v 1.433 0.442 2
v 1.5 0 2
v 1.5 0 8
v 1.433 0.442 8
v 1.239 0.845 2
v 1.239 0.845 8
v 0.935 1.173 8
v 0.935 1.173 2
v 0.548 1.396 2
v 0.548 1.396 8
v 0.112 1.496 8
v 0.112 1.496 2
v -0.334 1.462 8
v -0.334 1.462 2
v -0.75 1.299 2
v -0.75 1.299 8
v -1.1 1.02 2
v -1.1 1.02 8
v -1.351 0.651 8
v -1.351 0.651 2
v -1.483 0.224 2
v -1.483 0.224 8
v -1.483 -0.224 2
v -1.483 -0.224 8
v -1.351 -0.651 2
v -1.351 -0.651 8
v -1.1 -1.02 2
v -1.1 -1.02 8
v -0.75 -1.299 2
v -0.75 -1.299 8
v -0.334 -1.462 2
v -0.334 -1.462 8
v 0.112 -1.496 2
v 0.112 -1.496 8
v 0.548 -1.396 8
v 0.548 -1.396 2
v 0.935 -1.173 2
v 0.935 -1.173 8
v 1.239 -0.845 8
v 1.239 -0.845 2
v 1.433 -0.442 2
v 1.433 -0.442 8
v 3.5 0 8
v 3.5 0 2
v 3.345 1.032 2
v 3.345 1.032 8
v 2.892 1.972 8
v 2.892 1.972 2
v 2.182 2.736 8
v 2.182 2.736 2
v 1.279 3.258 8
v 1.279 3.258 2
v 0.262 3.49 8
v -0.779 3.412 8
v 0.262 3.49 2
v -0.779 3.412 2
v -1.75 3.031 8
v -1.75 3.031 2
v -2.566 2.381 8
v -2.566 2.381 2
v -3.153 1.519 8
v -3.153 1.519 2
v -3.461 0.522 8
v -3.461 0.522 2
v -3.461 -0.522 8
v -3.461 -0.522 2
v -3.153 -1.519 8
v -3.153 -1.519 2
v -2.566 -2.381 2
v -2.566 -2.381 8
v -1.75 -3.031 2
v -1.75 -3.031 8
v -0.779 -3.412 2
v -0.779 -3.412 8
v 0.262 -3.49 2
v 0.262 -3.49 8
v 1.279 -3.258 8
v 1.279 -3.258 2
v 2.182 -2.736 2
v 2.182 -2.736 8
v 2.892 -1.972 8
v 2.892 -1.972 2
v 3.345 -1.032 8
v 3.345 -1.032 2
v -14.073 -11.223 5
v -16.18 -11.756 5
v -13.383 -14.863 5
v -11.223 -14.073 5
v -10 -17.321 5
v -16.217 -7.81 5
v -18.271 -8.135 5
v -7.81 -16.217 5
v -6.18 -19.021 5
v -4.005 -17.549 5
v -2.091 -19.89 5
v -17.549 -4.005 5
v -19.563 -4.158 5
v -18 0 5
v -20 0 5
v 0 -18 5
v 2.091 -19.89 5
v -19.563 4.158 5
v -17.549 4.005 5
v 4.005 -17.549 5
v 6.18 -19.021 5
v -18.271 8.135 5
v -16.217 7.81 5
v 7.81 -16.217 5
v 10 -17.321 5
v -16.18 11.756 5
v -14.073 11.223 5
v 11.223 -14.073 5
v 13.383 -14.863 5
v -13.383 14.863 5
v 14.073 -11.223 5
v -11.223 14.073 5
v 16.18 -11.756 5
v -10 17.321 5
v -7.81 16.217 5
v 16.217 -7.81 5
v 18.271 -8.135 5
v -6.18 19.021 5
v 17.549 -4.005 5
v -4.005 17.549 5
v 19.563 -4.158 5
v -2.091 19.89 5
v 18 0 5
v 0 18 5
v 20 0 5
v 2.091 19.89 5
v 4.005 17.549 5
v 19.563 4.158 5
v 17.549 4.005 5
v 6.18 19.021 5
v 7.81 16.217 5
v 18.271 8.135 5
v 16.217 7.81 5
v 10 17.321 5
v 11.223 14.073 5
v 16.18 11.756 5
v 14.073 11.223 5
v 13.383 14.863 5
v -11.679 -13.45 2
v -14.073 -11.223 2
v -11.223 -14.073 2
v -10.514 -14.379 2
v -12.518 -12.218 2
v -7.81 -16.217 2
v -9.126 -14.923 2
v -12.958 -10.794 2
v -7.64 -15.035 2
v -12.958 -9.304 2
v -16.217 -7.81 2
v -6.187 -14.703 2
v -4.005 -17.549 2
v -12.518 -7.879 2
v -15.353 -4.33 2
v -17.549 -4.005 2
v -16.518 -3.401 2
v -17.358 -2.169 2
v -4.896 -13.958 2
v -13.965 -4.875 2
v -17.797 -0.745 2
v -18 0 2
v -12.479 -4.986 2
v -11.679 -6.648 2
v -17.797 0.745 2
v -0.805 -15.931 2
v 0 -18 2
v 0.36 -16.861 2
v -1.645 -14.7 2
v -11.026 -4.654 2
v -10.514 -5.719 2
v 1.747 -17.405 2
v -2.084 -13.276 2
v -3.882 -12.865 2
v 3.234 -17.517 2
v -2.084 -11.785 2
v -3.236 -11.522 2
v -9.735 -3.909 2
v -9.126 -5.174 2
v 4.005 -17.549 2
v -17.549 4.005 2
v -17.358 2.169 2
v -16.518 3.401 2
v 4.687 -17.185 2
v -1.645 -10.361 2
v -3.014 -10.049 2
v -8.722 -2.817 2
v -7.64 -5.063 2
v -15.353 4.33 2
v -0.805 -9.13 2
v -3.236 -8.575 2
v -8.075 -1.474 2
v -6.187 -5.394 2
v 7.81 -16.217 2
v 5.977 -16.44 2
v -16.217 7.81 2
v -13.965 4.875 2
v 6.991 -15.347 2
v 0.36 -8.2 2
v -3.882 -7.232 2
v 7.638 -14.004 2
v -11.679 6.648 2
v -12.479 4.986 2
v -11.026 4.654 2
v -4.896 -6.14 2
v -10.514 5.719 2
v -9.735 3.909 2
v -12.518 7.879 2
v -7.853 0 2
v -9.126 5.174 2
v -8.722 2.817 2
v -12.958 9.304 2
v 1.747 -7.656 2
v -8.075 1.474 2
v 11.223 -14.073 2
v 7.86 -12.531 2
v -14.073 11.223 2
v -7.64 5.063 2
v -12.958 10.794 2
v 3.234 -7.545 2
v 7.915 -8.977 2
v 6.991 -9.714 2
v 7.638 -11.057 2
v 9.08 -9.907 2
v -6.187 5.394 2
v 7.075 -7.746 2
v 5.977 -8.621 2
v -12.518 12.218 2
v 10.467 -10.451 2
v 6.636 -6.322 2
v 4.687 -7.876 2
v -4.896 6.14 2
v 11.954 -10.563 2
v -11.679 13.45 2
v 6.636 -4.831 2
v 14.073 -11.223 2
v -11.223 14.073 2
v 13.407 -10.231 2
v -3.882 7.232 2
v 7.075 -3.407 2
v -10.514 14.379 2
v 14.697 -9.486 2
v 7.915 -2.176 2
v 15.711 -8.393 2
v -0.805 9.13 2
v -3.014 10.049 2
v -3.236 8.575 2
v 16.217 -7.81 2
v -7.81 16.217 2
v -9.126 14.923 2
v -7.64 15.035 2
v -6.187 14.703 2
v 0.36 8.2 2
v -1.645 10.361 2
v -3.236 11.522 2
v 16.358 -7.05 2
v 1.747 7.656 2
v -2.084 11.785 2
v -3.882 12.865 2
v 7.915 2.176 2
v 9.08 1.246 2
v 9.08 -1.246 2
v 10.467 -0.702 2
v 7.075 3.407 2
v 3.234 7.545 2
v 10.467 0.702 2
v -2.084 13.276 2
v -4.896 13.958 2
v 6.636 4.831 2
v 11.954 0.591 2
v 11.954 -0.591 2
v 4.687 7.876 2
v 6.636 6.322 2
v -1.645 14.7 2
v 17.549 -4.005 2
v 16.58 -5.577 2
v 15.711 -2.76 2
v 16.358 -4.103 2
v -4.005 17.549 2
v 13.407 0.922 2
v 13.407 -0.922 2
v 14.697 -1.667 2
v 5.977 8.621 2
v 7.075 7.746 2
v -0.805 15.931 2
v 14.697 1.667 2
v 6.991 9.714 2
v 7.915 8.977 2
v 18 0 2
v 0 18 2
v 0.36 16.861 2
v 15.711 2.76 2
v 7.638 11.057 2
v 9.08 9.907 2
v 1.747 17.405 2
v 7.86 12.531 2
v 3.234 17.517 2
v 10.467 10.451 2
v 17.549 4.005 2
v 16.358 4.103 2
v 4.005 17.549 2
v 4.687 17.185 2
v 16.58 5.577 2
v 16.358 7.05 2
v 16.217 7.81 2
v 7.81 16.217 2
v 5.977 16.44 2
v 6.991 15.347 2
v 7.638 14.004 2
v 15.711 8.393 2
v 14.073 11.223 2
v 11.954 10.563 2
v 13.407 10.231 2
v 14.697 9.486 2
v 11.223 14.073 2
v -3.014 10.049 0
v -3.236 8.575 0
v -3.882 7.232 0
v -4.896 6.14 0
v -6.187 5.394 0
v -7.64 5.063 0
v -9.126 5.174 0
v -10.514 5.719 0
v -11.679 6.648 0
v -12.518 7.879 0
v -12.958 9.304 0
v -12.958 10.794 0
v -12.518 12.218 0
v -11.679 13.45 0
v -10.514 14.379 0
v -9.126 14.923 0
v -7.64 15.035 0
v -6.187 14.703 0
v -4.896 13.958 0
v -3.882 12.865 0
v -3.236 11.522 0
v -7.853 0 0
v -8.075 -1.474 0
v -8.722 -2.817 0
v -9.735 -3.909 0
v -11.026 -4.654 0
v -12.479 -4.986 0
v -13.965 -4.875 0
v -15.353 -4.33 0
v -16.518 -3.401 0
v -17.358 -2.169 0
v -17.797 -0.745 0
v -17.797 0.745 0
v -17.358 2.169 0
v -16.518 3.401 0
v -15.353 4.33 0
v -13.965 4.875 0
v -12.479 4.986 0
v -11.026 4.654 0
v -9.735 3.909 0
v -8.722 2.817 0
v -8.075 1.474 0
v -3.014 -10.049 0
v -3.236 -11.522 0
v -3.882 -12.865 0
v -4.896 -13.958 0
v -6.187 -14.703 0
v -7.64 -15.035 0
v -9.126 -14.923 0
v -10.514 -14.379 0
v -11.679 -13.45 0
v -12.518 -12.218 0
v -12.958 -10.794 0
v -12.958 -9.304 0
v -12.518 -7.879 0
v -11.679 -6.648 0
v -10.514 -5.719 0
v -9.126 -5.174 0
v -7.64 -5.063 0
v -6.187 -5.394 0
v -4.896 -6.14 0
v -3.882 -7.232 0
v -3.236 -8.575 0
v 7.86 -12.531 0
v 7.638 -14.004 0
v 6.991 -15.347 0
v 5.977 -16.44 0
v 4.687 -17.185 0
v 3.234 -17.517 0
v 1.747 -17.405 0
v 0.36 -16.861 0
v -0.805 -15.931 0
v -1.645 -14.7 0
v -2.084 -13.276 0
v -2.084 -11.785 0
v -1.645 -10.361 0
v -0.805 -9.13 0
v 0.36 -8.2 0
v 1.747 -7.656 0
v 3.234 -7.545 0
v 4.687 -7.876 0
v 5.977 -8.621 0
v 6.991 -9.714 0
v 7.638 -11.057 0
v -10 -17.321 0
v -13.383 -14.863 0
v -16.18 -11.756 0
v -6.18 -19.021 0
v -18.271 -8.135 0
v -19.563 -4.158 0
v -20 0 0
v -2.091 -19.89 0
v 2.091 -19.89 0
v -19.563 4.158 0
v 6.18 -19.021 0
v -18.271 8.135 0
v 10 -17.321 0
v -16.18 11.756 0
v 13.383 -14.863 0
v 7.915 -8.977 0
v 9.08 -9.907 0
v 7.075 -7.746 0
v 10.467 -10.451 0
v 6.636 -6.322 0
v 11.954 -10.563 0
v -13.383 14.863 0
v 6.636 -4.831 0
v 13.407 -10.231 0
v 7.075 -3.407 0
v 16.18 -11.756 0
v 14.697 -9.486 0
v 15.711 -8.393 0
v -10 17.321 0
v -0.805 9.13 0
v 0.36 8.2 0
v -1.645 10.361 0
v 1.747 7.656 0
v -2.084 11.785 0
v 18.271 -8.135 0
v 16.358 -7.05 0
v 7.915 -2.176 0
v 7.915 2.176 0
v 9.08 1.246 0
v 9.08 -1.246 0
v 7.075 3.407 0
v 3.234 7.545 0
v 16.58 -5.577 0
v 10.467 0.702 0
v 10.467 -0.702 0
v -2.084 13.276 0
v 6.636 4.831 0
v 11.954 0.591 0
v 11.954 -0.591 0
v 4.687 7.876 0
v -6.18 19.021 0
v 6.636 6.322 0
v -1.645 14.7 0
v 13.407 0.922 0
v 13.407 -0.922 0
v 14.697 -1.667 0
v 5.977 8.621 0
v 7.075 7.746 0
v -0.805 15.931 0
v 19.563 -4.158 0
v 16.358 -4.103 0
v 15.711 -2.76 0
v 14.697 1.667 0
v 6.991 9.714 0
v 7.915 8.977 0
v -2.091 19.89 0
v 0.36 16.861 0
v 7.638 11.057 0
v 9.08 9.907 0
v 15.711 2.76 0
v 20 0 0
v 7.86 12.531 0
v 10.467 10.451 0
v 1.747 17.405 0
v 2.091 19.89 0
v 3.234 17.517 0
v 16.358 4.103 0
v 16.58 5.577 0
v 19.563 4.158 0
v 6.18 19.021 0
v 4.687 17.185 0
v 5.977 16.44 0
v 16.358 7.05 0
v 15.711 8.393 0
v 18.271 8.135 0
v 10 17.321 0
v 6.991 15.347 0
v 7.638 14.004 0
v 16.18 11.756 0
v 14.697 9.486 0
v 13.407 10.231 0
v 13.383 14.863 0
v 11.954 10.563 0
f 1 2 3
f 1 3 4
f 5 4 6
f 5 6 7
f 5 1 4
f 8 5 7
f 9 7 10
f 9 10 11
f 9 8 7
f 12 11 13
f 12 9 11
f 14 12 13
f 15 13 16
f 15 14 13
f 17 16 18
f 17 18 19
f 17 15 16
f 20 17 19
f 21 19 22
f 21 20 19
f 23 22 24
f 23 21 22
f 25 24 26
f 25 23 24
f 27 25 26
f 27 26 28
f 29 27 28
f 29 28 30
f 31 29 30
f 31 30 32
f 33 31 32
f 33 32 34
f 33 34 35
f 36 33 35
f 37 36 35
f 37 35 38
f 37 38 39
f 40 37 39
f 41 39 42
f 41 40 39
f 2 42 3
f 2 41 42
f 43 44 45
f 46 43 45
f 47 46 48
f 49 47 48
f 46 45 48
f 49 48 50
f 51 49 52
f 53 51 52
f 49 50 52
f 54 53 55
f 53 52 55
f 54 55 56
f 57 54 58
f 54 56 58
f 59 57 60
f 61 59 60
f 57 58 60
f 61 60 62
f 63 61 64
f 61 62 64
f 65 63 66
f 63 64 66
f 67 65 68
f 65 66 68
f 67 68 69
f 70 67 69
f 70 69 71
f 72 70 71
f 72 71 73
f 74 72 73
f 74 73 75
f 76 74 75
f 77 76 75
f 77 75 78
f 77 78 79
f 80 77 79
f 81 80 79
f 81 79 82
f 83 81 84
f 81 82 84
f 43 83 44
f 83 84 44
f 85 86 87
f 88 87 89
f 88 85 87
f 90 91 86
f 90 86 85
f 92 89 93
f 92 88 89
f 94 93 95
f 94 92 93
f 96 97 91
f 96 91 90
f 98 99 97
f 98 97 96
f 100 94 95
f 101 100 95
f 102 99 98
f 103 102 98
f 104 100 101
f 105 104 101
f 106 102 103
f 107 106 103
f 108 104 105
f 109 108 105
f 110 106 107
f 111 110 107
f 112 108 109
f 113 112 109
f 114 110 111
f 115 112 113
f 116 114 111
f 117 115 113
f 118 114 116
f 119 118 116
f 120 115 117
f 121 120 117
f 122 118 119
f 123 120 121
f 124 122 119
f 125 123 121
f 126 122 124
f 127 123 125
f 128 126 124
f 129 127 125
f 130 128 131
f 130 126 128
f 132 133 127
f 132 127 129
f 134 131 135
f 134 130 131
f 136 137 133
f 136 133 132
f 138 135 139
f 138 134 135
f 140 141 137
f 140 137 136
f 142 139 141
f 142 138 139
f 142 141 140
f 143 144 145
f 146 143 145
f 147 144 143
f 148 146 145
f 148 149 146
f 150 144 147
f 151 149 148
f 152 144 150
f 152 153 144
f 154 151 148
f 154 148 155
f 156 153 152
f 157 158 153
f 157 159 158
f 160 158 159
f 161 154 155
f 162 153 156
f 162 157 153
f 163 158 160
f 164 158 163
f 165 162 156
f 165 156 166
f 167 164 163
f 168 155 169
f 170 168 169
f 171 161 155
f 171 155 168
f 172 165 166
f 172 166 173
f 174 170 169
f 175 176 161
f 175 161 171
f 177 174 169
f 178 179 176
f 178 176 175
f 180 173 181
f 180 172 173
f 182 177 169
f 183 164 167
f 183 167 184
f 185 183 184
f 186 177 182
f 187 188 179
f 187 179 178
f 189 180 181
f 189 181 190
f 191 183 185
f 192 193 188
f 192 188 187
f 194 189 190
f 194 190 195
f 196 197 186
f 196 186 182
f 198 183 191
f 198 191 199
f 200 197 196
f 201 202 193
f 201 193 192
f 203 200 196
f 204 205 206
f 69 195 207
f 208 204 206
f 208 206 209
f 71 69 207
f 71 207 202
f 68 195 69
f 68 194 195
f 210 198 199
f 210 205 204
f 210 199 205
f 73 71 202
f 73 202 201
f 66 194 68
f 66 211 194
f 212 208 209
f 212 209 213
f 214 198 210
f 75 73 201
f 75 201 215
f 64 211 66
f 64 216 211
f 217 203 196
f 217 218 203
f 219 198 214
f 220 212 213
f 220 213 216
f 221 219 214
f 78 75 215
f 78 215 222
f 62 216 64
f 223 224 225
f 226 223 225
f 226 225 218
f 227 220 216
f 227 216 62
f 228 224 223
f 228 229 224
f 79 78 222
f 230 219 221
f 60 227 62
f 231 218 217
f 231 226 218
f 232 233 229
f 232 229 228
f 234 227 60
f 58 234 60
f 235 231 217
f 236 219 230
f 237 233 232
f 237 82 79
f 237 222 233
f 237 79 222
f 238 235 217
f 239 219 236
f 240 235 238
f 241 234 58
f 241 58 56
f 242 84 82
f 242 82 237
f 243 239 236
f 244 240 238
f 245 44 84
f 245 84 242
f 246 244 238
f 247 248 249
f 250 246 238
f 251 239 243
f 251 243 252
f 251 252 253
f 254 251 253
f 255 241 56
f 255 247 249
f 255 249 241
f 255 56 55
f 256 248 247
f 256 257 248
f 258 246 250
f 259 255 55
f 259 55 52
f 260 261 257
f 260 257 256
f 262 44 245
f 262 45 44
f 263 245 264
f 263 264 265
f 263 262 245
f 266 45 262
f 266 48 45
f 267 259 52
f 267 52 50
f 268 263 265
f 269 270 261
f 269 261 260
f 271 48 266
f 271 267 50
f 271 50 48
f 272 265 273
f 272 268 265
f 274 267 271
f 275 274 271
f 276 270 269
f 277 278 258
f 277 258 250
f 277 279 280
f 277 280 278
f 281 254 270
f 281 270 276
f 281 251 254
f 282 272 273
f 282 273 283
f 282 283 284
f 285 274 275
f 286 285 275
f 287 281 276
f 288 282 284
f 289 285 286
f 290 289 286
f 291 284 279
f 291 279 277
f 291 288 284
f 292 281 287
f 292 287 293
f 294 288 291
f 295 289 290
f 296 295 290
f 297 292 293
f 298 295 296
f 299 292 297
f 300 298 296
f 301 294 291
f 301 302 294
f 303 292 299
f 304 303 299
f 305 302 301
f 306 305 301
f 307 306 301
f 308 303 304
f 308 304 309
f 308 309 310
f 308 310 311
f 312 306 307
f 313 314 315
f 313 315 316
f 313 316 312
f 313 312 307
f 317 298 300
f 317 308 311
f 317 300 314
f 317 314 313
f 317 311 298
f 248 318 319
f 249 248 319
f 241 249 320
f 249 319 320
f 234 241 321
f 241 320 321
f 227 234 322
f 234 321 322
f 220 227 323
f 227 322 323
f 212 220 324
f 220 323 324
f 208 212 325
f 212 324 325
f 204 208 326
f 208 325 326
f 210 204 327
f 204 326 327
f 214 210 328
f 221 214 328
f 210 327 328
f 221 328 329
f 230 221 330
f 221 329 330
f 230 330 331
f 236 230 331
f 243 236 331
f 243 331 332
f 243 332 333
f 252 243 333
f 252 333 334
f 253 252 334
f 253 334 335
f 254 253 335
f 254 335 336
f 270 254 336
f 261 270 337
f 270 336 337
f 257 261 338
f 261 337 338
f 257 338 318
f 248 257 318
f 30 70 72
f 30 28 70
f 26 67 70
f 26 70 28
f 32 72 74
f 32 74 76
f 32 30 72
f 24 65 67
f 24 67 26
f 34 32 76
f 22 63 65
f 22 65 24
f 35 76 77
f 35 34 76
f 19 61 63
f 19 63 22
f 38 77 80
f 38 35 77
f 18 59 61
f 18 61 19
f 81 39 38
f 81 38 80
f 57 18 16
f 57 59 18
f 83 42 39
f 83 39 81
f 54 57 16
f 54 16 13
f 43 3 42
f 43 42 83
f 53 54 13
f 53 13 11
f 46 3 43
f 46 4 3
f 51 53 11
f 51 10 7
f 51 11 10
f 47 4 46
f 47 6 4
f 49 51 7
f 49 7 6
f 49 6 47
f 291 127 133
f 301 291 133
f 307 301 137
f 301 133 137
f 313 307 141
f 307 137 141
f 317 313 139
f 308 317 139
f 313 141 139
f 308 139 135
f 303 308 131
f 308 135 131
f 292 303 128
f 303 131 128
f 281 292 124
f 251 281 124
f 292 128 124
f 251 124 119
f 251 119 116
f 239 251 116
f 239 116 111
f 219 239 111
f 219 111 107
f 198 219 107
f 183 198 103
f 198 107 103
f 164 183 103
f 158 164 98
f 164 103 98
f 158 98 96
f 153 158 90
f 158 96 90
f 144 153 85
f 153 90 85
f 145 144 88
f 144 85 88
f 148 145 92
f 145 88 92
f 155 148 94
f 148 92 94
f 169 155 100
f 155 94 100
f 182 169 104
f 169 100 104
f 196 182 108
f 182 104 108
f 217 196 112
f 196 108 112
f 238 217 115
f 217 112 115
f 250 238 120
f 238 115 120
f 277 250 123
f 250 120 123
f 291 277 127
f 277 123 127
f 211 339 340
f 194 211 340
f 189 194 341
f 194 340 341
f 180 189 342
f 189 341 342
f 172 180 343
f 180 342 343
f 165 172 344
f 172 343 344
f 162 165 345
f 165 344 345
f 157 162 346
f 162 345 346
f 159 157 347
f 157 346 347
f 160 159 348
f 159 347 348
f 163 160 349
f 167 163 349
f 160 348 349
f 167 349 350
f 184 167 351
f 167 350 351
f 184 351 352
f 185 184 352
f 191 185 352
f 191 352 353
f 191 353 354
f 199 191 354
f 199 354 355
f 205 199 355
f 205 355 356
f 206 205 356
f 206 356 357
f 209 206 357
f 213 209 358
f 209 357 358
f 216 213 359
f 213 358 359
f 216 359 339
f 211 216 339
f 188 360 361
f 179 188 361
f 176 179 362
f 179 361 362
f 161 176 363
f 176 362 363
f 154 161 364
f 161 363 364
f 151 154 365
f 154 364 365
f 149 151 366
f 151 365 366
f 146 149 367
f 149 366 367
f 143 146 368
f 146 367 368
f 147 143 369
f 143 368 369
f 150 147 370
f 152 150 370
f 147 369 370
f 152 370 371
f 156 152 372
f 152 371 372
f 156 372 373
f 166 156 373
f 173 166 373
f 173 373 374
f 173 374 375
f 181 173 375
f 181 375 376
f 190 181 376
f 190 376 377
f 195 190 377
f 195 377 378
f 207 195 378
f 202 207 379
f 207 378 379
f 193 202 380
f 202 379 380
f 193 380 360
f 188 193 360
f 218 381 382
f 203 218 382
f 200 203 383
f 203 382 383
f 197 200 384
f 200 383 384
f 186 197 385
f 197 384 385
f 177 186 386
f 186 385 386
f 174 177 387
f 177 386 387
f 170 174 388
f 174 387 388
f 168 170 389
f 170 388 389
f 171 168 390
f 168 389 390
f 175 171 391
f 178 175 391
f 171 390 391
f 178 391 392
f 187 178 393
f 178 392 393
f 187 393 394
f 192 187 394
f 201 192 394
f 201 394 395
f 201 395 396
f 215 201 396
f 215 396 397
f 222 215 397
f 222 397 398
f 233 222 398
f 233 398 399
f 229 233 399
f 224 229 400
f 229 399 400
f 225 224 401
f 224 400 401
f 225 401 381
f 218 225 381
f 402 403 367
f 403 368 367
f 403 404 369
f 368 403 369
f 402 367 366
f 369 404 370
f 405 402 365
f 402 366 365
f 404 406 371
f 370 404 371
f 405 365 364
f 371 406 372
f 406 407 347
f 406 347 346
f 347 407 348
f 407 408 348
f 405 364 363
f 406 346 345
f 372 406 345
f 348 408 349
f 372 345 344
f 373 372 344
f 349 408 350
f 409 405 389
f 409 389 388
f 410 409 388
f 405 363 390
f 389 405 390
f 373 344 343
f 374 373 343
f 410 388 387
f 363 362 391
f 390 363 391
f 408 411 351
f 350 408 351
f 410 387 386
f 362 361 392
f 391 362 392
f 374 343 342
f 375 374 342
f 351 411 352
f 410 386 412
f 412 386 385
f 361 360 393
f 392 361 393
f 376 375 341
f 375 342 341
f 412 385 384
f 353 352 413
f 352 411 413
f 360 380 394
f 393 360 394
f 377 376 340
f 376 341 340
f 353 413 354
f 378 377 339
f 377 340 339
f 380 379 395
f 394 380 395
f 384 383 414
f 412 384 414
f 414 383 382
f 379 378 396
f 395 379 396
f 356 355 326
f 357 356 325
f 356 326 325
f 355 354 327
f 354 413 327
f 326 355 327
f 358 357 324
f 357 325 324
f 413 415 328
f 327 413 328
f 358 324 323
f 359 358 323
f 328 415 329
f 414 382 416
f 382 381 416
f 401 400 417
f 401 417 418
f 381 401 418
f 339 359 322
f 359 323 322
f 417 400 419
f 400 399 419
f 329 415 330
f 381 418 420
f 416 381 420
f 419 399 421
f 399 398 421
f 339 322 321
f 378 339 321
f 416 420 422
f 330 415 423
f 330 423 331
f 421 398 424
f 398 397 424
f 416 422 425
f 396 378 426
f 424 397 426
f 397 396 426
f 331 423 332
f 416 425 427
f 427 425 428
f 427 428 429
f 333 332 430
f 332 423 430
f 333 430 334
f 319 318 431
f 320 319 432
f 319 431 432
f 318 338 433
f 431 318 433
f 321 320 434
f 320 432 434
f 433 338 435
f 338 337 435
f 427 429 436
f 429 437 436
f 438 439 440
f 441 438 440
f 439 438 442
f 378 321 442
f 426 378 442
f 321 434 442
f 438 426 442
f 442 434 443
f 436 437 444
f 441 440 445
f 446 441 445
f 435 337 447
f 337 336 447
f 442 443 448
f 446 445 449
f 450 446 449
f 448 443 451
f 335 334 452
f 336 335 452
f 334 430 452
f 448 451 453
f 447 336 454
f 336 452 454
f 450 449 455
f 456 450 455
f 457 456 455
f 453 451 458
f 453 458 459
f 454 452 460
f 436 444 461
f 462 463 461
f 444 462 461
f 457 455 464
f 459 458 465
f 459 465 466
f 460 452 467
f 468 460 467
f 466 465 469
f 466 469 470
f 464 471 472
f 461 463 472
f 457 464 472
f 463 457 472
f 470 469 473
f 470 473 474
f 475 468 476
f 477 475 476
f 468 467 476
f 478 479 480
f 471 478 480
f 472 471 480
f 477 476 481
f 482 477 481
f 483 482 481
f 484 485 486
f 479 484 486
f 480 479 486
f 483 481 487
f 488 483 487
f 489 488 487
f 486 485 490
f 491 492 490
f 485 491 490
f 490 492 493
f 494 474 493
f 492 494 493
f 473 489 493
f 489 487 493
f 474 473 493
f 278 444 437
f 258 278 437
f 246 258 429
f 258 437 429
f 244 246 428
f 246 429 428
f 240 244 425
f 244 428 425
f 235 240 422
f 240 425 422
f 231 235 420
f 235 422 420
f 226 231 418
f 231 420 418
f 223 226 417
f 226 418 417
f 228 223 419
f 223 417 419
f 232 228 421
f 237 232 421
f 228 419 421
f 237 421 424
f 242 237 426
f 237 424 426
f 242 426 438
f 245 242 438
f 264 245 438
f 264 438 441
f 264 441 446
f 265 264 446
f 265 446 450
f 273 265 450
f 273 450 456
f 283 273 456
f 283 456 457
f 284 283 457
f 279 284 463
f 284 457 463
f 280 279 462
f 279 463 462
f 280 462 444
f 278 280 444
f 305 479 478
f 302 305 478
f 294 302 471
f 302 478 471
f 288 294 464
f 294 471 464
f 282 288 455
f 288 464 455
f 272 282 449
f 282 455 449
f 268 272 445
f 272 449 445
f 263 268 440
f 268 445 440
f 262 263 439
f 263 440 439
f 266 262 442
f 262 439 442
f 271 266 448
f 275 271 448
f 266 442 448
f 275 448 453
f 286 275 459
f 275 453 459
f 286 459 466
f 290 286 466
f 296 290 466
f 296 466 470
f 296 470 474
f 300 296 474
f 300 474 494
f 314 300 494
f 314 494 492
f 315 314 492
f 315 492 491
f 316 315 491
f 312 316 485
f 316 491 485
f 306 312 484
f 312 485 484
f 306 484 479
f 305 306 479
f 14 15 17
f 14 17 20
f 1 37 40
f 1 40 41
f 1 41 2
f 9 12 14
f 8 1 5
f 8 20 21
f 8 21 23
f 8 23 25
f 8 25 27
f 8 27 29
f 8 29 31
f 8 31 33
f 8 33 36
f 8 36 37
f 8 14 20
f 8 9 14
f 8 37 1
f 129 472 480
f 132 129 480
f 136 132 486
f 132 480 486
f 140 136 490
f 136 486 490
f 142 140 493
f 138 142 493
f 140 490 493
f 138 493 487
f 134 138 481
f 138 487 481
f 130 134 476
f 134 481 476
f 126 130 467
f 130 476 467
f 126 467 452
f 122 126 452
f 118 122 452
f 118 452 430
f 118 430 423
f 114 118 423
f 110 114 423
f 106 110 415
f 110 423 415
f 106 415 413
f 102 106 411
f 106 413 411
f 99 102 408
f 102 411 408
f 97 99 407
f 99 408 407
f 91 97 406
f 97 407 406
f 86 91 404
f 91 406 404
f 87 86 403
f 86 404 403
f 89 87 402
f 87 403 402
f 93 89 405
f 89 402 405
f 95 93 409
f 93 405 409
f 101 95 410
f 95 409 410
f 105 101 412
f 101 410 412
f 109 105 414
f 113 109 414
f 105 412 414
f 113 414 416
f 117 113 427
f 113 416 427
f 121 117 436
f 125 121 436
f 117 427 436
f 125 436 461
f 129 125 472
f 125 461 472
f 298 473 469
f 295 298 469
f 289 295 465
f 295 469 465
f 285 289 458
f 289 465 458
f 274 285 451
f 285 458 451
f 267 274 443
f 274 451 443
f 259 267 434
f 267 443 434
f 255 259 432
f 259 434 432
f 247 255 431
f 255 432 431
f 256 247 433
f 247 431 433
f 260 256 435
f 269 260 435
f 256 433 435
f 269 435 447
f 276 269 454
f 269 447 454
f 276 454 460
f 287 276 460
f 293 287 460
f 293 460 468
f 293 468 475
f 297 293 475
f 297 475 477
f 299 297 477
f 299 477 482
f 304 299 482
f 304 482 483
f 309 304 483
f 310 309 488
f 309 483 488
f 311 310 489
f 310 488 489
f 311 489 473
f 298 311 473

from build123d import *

# Parameters (mm, degrees)
F0_R     = 20
F1_DEPTH = 5
F2_R     = 18
F3_DEPTH = 3
F4_R     = 3.5
F4_R_2   = 1.5
F5_DEPTH = 6
F6_R     = 5
F7_DEPTH = 2


with BuildPart() as f1:
    # F0 (on Top) → F1 (new body)
    with BuildSketch(Plane.XY):
        Circle(F0_R)
    extrude(amount=F1_DEPTH)

    # F2 (on face) → F3 (cut)
    with BuildSketch(Plane.XY.offset(5)):
        Circle(F2_R)
    extrude(amount=-F3_DEPTH, mode=Mode.SUBTRACT)

    # F4 (on face) → F5 (join)
    with BuildSketch(Plane.XY.offset(2)):
        Circle(F4_R)
        Circle(F4_R_2, mode=Mode.SUBTRACT)
    extrude(amount=F5_DEPTH)

    # F6 (on face) → F7 (cut)
    with BuildSketch(Plane(origin=(0, 0, 0), x_dir=(1, 0, 0), z_dir=(0, 0, -1))):
        with Locations((-12.852788, 0)):
            Circle(F6_R)
        with Locations((-8.013582, -10.048714)):
            Circle(F6_R)
        with Locations((2.860014, -12.530542)):
            Circle(F6_R)
        with Locations((11.579962, -5.576616)):
            Circle(F6_R)
        with Locations((11.579962, 5.576616)):
            Circle(F6_R)
        with Locations((2.860014, 12.530542)):
            Circle(F6_R)
        with Locations((-8.013582, 10.048714)):
            Circle(F6_R)
    extrude(amount=-F7_DEPTH, mode=Mode.SUBTRACT)


solid = f1.part
